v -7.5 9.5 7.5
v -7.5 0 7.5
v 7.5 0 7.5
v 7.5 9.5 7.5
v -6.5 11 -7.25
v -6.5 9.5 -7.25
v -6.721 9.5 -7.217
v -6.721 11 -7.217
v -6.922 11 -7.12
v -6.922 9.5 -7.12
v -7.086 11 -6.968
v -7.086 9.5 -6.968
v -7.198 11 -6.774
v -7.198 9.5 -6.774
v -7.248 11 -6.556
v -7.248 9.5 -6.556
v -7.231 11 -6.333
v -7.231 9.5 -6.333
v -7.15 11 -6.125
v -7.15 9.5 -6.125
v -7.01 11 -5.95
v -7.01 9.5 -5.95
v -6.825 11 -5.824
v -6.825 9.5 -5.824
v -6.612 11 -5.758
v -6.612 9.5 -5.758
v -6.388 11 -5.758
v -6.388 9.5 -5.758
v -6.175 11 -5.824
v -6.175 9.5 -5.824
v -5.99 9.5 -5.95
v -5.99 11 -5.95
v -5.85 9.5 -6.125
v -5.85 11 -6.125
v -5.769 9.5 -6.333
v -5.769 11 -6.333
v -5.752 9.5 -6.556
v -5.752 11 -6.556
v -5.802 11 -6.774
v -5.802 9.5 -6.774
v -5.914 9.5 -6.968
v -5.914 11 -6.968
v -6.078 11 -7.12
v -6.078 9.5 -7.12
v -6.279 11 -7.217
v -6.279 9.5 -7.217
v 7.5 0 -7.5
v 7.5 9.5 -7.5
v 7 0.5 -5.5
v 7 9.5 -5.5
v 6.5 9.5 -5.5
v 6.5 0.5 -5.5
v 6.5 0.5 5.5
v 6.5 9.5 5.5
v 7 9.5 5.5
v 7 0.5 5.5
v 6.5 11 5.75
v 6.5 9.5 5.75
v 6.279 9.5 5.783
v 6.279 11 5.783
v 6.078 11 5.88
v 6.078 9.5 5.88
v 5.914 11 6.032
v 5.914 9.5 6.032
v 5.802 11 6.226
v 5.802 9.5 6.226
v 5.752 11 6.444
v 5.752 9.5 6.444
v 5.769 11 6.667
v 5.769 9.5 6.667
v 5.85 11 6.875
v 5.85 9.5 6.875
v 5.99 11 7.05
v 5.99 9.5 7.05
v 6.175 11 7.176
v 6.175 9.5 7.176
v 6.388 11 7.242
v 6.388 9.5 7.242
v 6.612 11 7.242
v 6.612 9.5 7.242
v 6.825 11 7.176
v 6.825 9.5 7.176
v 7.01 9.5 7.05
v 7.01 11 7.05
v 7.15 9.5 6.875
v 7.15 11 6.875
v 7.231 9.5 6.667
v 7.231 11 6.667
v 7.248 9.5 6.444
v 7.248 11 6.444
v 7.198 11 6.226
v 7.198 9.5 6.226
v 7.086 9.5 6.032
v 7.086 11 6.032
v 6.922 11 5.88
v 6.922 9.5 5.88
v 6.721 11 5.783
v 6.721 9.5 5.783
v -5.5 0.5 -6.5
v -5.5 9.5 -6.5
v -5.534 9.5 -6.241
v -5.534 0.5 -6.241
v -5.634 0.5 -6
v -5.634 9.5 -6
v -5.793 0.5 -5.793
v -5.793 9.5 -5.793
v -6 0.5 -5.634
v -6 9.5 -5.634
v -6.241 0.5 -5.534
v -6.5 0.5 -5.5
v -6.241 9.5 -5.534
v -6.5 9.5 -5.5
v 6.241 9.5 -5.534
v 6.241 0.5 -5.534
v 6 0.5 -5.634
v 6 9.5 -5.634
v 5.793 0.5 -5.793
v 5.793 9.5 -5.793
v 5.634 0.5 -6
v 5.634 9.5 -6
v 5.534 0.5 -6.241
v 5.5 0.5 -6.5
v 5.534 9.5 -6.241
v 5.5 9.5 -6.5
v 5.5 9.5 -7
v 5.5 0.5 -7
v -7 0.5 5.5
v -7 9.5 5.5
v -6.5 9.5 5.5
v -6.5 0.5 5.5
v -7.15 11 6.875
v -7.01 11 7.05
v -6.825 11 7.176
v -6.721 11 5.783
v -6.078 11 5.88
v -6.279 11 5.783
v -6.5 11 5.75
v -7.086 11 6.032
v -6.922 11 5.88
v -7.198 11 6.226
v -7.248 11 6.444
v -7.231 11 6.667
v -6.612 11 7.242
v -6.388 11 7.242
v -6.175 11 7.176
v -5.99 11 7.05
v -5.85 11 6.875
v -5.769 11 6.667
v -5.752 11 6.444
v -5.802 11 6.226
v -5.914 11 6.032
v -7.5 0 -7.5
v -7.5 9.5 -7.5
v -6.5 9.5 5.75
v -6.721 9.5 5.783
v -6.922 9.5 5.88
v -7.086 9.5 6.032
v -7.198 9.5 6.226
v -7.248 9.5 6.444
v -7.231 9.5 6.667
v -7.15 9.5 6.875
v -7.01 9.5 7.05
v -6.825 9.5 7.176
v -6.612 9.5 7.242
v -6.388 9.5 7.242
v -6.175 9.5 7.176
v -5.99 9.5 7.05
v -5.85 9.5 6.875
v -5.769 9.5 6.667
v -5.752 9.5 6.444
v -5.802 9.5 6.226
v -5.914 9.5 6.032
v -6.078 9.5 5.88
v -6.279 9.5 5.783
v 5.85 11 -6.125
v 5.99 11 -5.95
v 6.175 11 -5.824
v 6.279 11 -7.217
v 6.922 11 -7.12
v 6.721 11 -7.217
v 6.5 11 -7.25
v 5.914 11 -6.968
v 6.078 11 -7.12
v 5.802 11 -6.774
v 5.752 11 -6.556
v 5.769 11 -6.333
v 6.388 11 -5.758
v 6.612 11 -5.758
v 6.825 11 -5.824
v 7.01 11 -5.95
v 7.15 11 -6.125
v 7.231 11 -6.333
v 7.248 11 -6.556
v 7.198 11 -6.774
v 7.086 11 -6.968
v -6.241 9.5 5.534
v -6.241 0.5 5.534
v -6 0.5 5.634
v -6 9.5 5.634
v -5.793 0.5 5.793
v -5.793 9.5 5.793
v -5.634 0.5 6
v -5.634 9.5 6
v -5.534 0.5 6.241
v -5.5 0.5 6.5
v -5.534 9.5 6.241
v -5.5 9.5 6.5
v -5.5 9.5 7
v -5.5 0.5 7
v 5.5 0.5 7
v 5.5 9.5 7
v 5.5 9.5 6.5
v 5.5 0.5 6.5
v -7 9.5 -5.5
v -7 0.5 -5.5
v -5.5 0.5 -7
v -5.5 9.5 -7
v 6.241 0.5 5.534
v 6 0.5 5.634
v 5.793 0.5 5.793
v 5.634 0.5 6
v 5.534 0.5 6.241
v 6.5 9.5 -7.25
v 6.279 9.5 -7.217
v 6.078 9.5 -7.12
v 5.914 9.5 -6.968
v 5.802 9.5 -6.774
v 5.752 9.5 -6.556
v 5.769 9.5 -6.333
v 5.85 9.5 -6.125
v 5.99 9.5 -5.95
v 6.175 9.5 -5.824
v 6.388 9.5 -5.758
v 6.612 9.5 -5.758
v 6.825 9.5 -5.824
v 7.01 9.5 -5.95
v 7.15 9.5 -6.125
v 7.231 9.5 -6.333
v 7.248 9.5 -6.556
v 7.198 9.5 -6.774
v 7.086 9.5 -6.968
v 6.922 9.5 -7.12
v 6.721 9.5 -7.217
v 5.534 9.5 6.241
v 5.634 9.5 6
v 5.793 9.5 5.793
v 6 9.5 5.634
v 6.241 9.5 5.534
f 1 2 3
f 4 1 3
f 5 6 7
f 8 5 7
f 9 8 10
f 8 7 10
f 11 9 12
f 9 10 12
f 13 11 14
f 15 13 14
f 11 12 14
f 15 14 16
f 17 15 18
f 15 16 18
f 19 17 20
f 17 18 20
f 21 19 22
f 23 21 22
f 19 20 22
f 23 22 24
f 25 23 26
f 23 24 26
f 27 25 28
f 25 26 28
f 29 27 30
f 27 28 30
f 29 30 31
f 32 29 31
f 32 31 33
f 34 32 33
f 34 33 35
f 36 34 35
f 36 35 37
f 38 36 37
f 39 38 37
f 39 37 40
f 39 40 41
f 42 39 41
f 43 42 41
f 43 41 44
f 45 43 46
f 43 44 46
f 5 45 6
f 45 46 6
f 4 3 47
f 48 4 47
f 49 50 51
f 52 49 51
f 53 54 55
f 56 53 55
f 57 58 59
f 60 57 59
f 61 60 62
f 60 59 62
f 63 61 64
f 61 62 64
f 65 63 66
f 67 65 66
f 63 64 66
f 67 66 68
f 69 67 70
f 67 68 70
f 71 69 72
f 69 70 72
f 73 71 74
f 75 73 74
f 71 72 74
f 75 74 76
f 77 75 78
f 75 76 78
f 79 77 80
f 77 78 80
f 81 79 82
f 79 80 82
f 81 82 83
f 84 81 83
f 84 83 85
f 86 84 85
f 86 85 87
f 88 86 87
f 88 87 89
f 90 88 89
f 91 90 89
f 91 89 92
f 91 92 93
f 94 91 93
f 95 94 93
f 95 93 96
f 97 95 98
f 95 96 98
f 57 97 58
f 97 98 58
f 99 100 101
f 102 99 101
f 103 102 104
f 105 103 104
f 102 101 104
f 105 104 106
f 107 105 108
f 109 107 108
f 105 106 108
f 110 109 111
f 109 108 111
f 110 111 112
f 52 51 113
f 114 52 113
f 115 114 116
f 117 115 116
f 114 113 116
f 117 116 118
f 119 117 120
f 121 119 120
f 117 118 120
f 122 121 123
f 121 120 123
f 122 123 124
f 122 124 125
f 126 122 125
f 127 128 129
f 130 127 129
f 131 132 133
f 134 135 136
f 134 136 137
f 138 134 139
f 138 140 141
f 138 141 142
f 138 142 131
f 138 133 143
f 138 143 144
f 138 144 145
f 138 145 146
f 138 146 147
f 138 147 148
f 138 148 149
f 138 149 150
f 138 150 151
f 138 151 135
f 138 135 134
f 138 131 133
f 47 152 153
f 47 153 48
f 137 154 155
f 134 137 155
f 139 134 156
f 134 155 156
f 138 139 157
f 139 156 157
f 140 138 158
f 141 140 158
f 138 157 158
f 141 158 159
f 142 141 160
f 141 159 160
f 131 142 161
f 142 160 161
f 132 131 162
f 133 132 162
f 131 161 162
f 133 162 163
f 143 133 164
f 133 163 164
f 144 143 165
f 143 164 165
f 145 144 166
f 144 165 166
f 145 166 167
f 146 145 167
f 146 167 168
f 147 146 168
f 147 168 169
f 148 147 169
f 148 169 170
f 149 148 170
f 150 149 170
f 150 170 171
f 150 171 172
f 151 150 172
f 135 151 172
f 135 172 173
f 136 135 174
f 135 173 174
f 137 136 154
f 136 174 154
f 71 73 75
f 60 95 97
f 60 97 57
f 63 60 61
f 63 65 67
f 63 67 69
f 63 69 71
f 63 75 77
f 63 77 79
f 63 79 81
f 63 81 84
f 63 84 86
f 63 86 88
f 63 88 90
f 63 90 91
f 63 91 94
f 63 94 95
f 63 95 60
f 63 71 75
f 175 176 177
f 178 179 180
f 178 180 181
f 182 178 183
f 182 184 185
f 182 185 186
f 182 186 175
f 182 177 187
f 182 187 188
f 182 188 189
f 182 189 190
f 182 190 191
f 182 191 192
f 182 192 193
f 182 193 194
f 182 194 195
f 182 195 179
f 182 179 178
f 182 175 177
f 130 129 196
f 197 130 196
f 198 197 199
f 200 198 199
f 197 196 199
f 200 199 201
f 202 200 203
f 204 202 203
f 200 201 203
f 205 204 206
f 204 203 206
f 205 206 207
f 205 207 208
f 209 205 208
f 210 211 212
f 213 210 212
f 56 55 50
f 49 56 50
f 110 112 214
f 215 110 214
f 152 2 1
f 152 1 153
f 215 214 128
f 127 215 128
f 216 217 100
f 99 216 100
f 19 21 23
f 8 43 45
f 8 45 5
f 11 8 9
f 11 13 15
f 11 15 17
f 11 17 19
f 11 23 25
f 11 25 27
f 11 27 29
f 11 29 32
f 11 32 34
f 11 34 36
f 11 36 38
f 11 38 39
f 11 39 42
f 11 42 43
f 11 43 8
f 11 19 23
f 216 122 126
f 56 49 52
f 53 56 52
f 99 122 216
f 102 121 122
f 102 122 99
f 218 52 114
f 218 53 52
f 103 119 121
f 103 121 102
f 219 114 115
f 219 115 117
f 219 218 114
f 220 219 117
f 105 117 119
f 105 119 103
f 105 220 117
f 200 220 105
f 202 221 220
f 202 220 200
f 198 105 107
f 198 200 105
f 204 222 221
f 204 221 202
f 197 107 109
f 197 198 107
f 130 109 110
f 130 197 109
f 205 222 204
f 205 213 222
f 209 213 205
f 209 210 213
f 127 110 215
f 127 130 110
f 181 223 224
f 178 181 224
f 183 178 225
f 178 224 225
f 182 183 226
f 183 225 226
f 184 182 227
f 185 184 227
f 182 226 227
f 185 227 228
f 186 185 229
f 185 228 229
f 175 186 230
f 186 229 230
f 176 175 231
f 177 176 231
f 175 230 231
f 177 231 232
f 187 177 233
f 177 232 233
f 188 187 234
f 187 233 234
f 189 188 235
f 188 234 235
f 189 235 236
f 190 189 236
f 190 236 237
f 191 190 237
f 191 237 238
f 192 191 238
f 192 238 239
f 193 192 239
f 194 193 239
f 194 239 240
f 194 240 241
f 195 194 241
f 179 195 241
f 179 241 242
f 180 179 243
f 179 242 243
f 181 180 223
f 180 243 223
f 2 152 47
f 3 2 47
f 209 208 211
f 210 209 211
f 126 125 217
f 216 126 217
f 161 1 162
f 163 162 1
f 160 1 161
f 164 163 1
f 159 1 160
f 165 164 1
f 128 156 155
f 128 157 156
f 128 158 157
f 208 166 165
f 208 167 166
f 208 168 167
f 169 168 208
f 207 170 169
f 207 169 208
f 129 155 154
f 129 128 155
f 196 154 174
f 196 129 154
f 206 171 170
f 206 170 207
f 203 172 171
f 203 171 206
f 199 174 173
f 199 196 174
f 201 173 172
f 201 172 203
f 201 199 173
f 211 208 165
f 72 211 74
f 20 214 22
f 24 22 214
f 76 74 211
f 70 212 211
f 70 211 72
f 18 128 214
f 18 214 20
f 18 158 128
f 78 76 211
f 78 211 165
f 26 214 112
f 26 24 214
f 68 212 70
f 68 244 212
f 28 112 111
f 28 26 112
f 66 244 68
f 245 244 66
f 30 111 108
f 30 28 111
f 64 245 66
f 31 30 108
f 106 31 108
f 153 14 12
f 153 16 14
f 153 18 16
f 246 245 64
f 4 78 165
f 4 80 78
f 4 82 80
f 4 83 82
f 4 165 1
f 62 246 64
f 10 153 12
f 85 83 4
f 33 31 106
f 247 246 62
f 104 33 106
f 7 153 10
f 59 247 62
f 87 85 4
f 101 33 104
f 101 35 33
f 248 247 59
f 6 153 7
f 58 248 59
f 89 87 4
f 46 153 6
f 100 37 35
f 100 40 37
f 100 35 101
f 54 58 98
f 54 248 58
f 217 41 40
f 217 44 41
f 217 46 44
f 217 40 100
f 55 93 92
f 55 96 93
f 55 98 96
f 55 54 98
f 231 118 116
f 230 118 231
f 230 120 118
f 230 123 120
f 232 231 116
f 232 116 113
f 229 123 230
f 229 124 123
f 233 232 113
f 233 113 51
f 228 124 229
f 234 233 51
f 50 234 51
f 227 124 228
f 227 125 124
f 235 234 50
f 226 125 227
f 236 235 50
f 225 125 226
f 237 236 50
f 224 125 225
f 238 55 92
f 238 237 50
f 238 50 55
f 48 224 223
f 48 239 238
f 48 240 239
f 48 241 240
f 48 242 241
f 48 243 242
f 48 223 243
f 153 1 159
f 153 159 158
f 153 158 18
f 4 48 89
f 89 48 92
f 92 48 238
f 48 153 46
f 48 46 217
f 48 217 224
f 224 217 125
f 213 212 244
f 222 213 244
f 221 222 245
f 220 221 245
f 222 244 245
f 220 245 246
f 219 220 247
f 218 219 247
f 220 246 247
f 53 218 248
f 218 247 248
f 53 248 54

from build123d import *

# Parameters (mm, degrees)
SKETCH_1_W          = 15
SKETCH_1_H          = 15
EXTRUDE_1_DEPTH     = 9.5
CUT_EXTRUDE_1_DEPTH = 9
SKETCH_5_R          = 0.75
EXTRUDE_2_DEPTH     = 1.5


with BuildPart() as part:
    # 草图1 → 凸台-拉伸1 (new body)
    with BuildSketch(Plane(origin=(0, 0, 0), x_dir=(1, 0, 0), z_dir=(0, 1, 0))):
        Rectangle(SKETCH_1_W, SKETCH_1_H)
    extrude(amount=EXTRUDE_1_DEPTH)

    # 草图2 → 切除-拉伸1 (cut)
    with BuildSketch(Plane(origin=(0, 9.5, 0), x_dir=(-1, 0, 0), z_dir=(0, 1, 0))):
        with BuildLine():
            Line((6.5, -5.5), (7, -5.5))
            Line((7, -5.5), (7, 5.5))
            Line((7, 5.5), (6.5, 5.5))
            ThreePointArc((6.5, 5.5), (5.792893219, 5.792893219), (5.5, 6.5))
            Line((5.5, 6.5), (5.5, 7))
            Line((5.5, 7), (-5.5, 7))
            Line((-5.5, 7), (-5.5, 6.5))
            ThreePointArc((-5.5, 6.5), (-5.792893219, 5.792893219), (-6.5, 5.5))
            Line((-6.5, 5.5), (-7, 5.5))
            Line((-7, 5.5), (-7, -5.5))
            Line((-7, -5.5), (-6.5, -5.5))
            ThreePointArc((-6.5, -5.5), (-5.792893219, -5.792893219), (-5.5, -6.5))
            Line((-5.5, -6.5), (-5.5, -7))
            Line((-5.5, -7), (5.5, -7))
            Line((5.5, -7), (5.5, -6.5))
            ThreePointArc((5.5, -6.5), (5.792893219, -5.792893219), (6.5, -5.5))
        make_face()
    extrude(amount=-CUT_EXTRUDE_1_DEPTH, mode=Mode.SUBTRACT)

    # 草图5 → 凸台-拉伸2 (add)
    with BuildSketch(Plane(origin=(0, 9.5, 0), x_dir=(-1, 0, 0), z_dir=(0, 1, 0))):
        with Locations(Location((6.5, -6.5, 0), (0, 0, 270))):
            Circle(SKETCH_5_R)
        with Locations(Location((6.5, 6.5, 0), (0, 0, 270))):
            Circle(SKETCH_5_R)
        with Locations(Location((-6.5, 6.5, 0), (0, 0, 270))):
            Circle(SKETCH_5_R)
        with Locations(Location((-6.5, -6.5, 0), (0, 0, 270))):
            Circle(SKETCH_5_R)
    extrude(amount=EXTRUDE_2_DEPTH)


solid = part.part
